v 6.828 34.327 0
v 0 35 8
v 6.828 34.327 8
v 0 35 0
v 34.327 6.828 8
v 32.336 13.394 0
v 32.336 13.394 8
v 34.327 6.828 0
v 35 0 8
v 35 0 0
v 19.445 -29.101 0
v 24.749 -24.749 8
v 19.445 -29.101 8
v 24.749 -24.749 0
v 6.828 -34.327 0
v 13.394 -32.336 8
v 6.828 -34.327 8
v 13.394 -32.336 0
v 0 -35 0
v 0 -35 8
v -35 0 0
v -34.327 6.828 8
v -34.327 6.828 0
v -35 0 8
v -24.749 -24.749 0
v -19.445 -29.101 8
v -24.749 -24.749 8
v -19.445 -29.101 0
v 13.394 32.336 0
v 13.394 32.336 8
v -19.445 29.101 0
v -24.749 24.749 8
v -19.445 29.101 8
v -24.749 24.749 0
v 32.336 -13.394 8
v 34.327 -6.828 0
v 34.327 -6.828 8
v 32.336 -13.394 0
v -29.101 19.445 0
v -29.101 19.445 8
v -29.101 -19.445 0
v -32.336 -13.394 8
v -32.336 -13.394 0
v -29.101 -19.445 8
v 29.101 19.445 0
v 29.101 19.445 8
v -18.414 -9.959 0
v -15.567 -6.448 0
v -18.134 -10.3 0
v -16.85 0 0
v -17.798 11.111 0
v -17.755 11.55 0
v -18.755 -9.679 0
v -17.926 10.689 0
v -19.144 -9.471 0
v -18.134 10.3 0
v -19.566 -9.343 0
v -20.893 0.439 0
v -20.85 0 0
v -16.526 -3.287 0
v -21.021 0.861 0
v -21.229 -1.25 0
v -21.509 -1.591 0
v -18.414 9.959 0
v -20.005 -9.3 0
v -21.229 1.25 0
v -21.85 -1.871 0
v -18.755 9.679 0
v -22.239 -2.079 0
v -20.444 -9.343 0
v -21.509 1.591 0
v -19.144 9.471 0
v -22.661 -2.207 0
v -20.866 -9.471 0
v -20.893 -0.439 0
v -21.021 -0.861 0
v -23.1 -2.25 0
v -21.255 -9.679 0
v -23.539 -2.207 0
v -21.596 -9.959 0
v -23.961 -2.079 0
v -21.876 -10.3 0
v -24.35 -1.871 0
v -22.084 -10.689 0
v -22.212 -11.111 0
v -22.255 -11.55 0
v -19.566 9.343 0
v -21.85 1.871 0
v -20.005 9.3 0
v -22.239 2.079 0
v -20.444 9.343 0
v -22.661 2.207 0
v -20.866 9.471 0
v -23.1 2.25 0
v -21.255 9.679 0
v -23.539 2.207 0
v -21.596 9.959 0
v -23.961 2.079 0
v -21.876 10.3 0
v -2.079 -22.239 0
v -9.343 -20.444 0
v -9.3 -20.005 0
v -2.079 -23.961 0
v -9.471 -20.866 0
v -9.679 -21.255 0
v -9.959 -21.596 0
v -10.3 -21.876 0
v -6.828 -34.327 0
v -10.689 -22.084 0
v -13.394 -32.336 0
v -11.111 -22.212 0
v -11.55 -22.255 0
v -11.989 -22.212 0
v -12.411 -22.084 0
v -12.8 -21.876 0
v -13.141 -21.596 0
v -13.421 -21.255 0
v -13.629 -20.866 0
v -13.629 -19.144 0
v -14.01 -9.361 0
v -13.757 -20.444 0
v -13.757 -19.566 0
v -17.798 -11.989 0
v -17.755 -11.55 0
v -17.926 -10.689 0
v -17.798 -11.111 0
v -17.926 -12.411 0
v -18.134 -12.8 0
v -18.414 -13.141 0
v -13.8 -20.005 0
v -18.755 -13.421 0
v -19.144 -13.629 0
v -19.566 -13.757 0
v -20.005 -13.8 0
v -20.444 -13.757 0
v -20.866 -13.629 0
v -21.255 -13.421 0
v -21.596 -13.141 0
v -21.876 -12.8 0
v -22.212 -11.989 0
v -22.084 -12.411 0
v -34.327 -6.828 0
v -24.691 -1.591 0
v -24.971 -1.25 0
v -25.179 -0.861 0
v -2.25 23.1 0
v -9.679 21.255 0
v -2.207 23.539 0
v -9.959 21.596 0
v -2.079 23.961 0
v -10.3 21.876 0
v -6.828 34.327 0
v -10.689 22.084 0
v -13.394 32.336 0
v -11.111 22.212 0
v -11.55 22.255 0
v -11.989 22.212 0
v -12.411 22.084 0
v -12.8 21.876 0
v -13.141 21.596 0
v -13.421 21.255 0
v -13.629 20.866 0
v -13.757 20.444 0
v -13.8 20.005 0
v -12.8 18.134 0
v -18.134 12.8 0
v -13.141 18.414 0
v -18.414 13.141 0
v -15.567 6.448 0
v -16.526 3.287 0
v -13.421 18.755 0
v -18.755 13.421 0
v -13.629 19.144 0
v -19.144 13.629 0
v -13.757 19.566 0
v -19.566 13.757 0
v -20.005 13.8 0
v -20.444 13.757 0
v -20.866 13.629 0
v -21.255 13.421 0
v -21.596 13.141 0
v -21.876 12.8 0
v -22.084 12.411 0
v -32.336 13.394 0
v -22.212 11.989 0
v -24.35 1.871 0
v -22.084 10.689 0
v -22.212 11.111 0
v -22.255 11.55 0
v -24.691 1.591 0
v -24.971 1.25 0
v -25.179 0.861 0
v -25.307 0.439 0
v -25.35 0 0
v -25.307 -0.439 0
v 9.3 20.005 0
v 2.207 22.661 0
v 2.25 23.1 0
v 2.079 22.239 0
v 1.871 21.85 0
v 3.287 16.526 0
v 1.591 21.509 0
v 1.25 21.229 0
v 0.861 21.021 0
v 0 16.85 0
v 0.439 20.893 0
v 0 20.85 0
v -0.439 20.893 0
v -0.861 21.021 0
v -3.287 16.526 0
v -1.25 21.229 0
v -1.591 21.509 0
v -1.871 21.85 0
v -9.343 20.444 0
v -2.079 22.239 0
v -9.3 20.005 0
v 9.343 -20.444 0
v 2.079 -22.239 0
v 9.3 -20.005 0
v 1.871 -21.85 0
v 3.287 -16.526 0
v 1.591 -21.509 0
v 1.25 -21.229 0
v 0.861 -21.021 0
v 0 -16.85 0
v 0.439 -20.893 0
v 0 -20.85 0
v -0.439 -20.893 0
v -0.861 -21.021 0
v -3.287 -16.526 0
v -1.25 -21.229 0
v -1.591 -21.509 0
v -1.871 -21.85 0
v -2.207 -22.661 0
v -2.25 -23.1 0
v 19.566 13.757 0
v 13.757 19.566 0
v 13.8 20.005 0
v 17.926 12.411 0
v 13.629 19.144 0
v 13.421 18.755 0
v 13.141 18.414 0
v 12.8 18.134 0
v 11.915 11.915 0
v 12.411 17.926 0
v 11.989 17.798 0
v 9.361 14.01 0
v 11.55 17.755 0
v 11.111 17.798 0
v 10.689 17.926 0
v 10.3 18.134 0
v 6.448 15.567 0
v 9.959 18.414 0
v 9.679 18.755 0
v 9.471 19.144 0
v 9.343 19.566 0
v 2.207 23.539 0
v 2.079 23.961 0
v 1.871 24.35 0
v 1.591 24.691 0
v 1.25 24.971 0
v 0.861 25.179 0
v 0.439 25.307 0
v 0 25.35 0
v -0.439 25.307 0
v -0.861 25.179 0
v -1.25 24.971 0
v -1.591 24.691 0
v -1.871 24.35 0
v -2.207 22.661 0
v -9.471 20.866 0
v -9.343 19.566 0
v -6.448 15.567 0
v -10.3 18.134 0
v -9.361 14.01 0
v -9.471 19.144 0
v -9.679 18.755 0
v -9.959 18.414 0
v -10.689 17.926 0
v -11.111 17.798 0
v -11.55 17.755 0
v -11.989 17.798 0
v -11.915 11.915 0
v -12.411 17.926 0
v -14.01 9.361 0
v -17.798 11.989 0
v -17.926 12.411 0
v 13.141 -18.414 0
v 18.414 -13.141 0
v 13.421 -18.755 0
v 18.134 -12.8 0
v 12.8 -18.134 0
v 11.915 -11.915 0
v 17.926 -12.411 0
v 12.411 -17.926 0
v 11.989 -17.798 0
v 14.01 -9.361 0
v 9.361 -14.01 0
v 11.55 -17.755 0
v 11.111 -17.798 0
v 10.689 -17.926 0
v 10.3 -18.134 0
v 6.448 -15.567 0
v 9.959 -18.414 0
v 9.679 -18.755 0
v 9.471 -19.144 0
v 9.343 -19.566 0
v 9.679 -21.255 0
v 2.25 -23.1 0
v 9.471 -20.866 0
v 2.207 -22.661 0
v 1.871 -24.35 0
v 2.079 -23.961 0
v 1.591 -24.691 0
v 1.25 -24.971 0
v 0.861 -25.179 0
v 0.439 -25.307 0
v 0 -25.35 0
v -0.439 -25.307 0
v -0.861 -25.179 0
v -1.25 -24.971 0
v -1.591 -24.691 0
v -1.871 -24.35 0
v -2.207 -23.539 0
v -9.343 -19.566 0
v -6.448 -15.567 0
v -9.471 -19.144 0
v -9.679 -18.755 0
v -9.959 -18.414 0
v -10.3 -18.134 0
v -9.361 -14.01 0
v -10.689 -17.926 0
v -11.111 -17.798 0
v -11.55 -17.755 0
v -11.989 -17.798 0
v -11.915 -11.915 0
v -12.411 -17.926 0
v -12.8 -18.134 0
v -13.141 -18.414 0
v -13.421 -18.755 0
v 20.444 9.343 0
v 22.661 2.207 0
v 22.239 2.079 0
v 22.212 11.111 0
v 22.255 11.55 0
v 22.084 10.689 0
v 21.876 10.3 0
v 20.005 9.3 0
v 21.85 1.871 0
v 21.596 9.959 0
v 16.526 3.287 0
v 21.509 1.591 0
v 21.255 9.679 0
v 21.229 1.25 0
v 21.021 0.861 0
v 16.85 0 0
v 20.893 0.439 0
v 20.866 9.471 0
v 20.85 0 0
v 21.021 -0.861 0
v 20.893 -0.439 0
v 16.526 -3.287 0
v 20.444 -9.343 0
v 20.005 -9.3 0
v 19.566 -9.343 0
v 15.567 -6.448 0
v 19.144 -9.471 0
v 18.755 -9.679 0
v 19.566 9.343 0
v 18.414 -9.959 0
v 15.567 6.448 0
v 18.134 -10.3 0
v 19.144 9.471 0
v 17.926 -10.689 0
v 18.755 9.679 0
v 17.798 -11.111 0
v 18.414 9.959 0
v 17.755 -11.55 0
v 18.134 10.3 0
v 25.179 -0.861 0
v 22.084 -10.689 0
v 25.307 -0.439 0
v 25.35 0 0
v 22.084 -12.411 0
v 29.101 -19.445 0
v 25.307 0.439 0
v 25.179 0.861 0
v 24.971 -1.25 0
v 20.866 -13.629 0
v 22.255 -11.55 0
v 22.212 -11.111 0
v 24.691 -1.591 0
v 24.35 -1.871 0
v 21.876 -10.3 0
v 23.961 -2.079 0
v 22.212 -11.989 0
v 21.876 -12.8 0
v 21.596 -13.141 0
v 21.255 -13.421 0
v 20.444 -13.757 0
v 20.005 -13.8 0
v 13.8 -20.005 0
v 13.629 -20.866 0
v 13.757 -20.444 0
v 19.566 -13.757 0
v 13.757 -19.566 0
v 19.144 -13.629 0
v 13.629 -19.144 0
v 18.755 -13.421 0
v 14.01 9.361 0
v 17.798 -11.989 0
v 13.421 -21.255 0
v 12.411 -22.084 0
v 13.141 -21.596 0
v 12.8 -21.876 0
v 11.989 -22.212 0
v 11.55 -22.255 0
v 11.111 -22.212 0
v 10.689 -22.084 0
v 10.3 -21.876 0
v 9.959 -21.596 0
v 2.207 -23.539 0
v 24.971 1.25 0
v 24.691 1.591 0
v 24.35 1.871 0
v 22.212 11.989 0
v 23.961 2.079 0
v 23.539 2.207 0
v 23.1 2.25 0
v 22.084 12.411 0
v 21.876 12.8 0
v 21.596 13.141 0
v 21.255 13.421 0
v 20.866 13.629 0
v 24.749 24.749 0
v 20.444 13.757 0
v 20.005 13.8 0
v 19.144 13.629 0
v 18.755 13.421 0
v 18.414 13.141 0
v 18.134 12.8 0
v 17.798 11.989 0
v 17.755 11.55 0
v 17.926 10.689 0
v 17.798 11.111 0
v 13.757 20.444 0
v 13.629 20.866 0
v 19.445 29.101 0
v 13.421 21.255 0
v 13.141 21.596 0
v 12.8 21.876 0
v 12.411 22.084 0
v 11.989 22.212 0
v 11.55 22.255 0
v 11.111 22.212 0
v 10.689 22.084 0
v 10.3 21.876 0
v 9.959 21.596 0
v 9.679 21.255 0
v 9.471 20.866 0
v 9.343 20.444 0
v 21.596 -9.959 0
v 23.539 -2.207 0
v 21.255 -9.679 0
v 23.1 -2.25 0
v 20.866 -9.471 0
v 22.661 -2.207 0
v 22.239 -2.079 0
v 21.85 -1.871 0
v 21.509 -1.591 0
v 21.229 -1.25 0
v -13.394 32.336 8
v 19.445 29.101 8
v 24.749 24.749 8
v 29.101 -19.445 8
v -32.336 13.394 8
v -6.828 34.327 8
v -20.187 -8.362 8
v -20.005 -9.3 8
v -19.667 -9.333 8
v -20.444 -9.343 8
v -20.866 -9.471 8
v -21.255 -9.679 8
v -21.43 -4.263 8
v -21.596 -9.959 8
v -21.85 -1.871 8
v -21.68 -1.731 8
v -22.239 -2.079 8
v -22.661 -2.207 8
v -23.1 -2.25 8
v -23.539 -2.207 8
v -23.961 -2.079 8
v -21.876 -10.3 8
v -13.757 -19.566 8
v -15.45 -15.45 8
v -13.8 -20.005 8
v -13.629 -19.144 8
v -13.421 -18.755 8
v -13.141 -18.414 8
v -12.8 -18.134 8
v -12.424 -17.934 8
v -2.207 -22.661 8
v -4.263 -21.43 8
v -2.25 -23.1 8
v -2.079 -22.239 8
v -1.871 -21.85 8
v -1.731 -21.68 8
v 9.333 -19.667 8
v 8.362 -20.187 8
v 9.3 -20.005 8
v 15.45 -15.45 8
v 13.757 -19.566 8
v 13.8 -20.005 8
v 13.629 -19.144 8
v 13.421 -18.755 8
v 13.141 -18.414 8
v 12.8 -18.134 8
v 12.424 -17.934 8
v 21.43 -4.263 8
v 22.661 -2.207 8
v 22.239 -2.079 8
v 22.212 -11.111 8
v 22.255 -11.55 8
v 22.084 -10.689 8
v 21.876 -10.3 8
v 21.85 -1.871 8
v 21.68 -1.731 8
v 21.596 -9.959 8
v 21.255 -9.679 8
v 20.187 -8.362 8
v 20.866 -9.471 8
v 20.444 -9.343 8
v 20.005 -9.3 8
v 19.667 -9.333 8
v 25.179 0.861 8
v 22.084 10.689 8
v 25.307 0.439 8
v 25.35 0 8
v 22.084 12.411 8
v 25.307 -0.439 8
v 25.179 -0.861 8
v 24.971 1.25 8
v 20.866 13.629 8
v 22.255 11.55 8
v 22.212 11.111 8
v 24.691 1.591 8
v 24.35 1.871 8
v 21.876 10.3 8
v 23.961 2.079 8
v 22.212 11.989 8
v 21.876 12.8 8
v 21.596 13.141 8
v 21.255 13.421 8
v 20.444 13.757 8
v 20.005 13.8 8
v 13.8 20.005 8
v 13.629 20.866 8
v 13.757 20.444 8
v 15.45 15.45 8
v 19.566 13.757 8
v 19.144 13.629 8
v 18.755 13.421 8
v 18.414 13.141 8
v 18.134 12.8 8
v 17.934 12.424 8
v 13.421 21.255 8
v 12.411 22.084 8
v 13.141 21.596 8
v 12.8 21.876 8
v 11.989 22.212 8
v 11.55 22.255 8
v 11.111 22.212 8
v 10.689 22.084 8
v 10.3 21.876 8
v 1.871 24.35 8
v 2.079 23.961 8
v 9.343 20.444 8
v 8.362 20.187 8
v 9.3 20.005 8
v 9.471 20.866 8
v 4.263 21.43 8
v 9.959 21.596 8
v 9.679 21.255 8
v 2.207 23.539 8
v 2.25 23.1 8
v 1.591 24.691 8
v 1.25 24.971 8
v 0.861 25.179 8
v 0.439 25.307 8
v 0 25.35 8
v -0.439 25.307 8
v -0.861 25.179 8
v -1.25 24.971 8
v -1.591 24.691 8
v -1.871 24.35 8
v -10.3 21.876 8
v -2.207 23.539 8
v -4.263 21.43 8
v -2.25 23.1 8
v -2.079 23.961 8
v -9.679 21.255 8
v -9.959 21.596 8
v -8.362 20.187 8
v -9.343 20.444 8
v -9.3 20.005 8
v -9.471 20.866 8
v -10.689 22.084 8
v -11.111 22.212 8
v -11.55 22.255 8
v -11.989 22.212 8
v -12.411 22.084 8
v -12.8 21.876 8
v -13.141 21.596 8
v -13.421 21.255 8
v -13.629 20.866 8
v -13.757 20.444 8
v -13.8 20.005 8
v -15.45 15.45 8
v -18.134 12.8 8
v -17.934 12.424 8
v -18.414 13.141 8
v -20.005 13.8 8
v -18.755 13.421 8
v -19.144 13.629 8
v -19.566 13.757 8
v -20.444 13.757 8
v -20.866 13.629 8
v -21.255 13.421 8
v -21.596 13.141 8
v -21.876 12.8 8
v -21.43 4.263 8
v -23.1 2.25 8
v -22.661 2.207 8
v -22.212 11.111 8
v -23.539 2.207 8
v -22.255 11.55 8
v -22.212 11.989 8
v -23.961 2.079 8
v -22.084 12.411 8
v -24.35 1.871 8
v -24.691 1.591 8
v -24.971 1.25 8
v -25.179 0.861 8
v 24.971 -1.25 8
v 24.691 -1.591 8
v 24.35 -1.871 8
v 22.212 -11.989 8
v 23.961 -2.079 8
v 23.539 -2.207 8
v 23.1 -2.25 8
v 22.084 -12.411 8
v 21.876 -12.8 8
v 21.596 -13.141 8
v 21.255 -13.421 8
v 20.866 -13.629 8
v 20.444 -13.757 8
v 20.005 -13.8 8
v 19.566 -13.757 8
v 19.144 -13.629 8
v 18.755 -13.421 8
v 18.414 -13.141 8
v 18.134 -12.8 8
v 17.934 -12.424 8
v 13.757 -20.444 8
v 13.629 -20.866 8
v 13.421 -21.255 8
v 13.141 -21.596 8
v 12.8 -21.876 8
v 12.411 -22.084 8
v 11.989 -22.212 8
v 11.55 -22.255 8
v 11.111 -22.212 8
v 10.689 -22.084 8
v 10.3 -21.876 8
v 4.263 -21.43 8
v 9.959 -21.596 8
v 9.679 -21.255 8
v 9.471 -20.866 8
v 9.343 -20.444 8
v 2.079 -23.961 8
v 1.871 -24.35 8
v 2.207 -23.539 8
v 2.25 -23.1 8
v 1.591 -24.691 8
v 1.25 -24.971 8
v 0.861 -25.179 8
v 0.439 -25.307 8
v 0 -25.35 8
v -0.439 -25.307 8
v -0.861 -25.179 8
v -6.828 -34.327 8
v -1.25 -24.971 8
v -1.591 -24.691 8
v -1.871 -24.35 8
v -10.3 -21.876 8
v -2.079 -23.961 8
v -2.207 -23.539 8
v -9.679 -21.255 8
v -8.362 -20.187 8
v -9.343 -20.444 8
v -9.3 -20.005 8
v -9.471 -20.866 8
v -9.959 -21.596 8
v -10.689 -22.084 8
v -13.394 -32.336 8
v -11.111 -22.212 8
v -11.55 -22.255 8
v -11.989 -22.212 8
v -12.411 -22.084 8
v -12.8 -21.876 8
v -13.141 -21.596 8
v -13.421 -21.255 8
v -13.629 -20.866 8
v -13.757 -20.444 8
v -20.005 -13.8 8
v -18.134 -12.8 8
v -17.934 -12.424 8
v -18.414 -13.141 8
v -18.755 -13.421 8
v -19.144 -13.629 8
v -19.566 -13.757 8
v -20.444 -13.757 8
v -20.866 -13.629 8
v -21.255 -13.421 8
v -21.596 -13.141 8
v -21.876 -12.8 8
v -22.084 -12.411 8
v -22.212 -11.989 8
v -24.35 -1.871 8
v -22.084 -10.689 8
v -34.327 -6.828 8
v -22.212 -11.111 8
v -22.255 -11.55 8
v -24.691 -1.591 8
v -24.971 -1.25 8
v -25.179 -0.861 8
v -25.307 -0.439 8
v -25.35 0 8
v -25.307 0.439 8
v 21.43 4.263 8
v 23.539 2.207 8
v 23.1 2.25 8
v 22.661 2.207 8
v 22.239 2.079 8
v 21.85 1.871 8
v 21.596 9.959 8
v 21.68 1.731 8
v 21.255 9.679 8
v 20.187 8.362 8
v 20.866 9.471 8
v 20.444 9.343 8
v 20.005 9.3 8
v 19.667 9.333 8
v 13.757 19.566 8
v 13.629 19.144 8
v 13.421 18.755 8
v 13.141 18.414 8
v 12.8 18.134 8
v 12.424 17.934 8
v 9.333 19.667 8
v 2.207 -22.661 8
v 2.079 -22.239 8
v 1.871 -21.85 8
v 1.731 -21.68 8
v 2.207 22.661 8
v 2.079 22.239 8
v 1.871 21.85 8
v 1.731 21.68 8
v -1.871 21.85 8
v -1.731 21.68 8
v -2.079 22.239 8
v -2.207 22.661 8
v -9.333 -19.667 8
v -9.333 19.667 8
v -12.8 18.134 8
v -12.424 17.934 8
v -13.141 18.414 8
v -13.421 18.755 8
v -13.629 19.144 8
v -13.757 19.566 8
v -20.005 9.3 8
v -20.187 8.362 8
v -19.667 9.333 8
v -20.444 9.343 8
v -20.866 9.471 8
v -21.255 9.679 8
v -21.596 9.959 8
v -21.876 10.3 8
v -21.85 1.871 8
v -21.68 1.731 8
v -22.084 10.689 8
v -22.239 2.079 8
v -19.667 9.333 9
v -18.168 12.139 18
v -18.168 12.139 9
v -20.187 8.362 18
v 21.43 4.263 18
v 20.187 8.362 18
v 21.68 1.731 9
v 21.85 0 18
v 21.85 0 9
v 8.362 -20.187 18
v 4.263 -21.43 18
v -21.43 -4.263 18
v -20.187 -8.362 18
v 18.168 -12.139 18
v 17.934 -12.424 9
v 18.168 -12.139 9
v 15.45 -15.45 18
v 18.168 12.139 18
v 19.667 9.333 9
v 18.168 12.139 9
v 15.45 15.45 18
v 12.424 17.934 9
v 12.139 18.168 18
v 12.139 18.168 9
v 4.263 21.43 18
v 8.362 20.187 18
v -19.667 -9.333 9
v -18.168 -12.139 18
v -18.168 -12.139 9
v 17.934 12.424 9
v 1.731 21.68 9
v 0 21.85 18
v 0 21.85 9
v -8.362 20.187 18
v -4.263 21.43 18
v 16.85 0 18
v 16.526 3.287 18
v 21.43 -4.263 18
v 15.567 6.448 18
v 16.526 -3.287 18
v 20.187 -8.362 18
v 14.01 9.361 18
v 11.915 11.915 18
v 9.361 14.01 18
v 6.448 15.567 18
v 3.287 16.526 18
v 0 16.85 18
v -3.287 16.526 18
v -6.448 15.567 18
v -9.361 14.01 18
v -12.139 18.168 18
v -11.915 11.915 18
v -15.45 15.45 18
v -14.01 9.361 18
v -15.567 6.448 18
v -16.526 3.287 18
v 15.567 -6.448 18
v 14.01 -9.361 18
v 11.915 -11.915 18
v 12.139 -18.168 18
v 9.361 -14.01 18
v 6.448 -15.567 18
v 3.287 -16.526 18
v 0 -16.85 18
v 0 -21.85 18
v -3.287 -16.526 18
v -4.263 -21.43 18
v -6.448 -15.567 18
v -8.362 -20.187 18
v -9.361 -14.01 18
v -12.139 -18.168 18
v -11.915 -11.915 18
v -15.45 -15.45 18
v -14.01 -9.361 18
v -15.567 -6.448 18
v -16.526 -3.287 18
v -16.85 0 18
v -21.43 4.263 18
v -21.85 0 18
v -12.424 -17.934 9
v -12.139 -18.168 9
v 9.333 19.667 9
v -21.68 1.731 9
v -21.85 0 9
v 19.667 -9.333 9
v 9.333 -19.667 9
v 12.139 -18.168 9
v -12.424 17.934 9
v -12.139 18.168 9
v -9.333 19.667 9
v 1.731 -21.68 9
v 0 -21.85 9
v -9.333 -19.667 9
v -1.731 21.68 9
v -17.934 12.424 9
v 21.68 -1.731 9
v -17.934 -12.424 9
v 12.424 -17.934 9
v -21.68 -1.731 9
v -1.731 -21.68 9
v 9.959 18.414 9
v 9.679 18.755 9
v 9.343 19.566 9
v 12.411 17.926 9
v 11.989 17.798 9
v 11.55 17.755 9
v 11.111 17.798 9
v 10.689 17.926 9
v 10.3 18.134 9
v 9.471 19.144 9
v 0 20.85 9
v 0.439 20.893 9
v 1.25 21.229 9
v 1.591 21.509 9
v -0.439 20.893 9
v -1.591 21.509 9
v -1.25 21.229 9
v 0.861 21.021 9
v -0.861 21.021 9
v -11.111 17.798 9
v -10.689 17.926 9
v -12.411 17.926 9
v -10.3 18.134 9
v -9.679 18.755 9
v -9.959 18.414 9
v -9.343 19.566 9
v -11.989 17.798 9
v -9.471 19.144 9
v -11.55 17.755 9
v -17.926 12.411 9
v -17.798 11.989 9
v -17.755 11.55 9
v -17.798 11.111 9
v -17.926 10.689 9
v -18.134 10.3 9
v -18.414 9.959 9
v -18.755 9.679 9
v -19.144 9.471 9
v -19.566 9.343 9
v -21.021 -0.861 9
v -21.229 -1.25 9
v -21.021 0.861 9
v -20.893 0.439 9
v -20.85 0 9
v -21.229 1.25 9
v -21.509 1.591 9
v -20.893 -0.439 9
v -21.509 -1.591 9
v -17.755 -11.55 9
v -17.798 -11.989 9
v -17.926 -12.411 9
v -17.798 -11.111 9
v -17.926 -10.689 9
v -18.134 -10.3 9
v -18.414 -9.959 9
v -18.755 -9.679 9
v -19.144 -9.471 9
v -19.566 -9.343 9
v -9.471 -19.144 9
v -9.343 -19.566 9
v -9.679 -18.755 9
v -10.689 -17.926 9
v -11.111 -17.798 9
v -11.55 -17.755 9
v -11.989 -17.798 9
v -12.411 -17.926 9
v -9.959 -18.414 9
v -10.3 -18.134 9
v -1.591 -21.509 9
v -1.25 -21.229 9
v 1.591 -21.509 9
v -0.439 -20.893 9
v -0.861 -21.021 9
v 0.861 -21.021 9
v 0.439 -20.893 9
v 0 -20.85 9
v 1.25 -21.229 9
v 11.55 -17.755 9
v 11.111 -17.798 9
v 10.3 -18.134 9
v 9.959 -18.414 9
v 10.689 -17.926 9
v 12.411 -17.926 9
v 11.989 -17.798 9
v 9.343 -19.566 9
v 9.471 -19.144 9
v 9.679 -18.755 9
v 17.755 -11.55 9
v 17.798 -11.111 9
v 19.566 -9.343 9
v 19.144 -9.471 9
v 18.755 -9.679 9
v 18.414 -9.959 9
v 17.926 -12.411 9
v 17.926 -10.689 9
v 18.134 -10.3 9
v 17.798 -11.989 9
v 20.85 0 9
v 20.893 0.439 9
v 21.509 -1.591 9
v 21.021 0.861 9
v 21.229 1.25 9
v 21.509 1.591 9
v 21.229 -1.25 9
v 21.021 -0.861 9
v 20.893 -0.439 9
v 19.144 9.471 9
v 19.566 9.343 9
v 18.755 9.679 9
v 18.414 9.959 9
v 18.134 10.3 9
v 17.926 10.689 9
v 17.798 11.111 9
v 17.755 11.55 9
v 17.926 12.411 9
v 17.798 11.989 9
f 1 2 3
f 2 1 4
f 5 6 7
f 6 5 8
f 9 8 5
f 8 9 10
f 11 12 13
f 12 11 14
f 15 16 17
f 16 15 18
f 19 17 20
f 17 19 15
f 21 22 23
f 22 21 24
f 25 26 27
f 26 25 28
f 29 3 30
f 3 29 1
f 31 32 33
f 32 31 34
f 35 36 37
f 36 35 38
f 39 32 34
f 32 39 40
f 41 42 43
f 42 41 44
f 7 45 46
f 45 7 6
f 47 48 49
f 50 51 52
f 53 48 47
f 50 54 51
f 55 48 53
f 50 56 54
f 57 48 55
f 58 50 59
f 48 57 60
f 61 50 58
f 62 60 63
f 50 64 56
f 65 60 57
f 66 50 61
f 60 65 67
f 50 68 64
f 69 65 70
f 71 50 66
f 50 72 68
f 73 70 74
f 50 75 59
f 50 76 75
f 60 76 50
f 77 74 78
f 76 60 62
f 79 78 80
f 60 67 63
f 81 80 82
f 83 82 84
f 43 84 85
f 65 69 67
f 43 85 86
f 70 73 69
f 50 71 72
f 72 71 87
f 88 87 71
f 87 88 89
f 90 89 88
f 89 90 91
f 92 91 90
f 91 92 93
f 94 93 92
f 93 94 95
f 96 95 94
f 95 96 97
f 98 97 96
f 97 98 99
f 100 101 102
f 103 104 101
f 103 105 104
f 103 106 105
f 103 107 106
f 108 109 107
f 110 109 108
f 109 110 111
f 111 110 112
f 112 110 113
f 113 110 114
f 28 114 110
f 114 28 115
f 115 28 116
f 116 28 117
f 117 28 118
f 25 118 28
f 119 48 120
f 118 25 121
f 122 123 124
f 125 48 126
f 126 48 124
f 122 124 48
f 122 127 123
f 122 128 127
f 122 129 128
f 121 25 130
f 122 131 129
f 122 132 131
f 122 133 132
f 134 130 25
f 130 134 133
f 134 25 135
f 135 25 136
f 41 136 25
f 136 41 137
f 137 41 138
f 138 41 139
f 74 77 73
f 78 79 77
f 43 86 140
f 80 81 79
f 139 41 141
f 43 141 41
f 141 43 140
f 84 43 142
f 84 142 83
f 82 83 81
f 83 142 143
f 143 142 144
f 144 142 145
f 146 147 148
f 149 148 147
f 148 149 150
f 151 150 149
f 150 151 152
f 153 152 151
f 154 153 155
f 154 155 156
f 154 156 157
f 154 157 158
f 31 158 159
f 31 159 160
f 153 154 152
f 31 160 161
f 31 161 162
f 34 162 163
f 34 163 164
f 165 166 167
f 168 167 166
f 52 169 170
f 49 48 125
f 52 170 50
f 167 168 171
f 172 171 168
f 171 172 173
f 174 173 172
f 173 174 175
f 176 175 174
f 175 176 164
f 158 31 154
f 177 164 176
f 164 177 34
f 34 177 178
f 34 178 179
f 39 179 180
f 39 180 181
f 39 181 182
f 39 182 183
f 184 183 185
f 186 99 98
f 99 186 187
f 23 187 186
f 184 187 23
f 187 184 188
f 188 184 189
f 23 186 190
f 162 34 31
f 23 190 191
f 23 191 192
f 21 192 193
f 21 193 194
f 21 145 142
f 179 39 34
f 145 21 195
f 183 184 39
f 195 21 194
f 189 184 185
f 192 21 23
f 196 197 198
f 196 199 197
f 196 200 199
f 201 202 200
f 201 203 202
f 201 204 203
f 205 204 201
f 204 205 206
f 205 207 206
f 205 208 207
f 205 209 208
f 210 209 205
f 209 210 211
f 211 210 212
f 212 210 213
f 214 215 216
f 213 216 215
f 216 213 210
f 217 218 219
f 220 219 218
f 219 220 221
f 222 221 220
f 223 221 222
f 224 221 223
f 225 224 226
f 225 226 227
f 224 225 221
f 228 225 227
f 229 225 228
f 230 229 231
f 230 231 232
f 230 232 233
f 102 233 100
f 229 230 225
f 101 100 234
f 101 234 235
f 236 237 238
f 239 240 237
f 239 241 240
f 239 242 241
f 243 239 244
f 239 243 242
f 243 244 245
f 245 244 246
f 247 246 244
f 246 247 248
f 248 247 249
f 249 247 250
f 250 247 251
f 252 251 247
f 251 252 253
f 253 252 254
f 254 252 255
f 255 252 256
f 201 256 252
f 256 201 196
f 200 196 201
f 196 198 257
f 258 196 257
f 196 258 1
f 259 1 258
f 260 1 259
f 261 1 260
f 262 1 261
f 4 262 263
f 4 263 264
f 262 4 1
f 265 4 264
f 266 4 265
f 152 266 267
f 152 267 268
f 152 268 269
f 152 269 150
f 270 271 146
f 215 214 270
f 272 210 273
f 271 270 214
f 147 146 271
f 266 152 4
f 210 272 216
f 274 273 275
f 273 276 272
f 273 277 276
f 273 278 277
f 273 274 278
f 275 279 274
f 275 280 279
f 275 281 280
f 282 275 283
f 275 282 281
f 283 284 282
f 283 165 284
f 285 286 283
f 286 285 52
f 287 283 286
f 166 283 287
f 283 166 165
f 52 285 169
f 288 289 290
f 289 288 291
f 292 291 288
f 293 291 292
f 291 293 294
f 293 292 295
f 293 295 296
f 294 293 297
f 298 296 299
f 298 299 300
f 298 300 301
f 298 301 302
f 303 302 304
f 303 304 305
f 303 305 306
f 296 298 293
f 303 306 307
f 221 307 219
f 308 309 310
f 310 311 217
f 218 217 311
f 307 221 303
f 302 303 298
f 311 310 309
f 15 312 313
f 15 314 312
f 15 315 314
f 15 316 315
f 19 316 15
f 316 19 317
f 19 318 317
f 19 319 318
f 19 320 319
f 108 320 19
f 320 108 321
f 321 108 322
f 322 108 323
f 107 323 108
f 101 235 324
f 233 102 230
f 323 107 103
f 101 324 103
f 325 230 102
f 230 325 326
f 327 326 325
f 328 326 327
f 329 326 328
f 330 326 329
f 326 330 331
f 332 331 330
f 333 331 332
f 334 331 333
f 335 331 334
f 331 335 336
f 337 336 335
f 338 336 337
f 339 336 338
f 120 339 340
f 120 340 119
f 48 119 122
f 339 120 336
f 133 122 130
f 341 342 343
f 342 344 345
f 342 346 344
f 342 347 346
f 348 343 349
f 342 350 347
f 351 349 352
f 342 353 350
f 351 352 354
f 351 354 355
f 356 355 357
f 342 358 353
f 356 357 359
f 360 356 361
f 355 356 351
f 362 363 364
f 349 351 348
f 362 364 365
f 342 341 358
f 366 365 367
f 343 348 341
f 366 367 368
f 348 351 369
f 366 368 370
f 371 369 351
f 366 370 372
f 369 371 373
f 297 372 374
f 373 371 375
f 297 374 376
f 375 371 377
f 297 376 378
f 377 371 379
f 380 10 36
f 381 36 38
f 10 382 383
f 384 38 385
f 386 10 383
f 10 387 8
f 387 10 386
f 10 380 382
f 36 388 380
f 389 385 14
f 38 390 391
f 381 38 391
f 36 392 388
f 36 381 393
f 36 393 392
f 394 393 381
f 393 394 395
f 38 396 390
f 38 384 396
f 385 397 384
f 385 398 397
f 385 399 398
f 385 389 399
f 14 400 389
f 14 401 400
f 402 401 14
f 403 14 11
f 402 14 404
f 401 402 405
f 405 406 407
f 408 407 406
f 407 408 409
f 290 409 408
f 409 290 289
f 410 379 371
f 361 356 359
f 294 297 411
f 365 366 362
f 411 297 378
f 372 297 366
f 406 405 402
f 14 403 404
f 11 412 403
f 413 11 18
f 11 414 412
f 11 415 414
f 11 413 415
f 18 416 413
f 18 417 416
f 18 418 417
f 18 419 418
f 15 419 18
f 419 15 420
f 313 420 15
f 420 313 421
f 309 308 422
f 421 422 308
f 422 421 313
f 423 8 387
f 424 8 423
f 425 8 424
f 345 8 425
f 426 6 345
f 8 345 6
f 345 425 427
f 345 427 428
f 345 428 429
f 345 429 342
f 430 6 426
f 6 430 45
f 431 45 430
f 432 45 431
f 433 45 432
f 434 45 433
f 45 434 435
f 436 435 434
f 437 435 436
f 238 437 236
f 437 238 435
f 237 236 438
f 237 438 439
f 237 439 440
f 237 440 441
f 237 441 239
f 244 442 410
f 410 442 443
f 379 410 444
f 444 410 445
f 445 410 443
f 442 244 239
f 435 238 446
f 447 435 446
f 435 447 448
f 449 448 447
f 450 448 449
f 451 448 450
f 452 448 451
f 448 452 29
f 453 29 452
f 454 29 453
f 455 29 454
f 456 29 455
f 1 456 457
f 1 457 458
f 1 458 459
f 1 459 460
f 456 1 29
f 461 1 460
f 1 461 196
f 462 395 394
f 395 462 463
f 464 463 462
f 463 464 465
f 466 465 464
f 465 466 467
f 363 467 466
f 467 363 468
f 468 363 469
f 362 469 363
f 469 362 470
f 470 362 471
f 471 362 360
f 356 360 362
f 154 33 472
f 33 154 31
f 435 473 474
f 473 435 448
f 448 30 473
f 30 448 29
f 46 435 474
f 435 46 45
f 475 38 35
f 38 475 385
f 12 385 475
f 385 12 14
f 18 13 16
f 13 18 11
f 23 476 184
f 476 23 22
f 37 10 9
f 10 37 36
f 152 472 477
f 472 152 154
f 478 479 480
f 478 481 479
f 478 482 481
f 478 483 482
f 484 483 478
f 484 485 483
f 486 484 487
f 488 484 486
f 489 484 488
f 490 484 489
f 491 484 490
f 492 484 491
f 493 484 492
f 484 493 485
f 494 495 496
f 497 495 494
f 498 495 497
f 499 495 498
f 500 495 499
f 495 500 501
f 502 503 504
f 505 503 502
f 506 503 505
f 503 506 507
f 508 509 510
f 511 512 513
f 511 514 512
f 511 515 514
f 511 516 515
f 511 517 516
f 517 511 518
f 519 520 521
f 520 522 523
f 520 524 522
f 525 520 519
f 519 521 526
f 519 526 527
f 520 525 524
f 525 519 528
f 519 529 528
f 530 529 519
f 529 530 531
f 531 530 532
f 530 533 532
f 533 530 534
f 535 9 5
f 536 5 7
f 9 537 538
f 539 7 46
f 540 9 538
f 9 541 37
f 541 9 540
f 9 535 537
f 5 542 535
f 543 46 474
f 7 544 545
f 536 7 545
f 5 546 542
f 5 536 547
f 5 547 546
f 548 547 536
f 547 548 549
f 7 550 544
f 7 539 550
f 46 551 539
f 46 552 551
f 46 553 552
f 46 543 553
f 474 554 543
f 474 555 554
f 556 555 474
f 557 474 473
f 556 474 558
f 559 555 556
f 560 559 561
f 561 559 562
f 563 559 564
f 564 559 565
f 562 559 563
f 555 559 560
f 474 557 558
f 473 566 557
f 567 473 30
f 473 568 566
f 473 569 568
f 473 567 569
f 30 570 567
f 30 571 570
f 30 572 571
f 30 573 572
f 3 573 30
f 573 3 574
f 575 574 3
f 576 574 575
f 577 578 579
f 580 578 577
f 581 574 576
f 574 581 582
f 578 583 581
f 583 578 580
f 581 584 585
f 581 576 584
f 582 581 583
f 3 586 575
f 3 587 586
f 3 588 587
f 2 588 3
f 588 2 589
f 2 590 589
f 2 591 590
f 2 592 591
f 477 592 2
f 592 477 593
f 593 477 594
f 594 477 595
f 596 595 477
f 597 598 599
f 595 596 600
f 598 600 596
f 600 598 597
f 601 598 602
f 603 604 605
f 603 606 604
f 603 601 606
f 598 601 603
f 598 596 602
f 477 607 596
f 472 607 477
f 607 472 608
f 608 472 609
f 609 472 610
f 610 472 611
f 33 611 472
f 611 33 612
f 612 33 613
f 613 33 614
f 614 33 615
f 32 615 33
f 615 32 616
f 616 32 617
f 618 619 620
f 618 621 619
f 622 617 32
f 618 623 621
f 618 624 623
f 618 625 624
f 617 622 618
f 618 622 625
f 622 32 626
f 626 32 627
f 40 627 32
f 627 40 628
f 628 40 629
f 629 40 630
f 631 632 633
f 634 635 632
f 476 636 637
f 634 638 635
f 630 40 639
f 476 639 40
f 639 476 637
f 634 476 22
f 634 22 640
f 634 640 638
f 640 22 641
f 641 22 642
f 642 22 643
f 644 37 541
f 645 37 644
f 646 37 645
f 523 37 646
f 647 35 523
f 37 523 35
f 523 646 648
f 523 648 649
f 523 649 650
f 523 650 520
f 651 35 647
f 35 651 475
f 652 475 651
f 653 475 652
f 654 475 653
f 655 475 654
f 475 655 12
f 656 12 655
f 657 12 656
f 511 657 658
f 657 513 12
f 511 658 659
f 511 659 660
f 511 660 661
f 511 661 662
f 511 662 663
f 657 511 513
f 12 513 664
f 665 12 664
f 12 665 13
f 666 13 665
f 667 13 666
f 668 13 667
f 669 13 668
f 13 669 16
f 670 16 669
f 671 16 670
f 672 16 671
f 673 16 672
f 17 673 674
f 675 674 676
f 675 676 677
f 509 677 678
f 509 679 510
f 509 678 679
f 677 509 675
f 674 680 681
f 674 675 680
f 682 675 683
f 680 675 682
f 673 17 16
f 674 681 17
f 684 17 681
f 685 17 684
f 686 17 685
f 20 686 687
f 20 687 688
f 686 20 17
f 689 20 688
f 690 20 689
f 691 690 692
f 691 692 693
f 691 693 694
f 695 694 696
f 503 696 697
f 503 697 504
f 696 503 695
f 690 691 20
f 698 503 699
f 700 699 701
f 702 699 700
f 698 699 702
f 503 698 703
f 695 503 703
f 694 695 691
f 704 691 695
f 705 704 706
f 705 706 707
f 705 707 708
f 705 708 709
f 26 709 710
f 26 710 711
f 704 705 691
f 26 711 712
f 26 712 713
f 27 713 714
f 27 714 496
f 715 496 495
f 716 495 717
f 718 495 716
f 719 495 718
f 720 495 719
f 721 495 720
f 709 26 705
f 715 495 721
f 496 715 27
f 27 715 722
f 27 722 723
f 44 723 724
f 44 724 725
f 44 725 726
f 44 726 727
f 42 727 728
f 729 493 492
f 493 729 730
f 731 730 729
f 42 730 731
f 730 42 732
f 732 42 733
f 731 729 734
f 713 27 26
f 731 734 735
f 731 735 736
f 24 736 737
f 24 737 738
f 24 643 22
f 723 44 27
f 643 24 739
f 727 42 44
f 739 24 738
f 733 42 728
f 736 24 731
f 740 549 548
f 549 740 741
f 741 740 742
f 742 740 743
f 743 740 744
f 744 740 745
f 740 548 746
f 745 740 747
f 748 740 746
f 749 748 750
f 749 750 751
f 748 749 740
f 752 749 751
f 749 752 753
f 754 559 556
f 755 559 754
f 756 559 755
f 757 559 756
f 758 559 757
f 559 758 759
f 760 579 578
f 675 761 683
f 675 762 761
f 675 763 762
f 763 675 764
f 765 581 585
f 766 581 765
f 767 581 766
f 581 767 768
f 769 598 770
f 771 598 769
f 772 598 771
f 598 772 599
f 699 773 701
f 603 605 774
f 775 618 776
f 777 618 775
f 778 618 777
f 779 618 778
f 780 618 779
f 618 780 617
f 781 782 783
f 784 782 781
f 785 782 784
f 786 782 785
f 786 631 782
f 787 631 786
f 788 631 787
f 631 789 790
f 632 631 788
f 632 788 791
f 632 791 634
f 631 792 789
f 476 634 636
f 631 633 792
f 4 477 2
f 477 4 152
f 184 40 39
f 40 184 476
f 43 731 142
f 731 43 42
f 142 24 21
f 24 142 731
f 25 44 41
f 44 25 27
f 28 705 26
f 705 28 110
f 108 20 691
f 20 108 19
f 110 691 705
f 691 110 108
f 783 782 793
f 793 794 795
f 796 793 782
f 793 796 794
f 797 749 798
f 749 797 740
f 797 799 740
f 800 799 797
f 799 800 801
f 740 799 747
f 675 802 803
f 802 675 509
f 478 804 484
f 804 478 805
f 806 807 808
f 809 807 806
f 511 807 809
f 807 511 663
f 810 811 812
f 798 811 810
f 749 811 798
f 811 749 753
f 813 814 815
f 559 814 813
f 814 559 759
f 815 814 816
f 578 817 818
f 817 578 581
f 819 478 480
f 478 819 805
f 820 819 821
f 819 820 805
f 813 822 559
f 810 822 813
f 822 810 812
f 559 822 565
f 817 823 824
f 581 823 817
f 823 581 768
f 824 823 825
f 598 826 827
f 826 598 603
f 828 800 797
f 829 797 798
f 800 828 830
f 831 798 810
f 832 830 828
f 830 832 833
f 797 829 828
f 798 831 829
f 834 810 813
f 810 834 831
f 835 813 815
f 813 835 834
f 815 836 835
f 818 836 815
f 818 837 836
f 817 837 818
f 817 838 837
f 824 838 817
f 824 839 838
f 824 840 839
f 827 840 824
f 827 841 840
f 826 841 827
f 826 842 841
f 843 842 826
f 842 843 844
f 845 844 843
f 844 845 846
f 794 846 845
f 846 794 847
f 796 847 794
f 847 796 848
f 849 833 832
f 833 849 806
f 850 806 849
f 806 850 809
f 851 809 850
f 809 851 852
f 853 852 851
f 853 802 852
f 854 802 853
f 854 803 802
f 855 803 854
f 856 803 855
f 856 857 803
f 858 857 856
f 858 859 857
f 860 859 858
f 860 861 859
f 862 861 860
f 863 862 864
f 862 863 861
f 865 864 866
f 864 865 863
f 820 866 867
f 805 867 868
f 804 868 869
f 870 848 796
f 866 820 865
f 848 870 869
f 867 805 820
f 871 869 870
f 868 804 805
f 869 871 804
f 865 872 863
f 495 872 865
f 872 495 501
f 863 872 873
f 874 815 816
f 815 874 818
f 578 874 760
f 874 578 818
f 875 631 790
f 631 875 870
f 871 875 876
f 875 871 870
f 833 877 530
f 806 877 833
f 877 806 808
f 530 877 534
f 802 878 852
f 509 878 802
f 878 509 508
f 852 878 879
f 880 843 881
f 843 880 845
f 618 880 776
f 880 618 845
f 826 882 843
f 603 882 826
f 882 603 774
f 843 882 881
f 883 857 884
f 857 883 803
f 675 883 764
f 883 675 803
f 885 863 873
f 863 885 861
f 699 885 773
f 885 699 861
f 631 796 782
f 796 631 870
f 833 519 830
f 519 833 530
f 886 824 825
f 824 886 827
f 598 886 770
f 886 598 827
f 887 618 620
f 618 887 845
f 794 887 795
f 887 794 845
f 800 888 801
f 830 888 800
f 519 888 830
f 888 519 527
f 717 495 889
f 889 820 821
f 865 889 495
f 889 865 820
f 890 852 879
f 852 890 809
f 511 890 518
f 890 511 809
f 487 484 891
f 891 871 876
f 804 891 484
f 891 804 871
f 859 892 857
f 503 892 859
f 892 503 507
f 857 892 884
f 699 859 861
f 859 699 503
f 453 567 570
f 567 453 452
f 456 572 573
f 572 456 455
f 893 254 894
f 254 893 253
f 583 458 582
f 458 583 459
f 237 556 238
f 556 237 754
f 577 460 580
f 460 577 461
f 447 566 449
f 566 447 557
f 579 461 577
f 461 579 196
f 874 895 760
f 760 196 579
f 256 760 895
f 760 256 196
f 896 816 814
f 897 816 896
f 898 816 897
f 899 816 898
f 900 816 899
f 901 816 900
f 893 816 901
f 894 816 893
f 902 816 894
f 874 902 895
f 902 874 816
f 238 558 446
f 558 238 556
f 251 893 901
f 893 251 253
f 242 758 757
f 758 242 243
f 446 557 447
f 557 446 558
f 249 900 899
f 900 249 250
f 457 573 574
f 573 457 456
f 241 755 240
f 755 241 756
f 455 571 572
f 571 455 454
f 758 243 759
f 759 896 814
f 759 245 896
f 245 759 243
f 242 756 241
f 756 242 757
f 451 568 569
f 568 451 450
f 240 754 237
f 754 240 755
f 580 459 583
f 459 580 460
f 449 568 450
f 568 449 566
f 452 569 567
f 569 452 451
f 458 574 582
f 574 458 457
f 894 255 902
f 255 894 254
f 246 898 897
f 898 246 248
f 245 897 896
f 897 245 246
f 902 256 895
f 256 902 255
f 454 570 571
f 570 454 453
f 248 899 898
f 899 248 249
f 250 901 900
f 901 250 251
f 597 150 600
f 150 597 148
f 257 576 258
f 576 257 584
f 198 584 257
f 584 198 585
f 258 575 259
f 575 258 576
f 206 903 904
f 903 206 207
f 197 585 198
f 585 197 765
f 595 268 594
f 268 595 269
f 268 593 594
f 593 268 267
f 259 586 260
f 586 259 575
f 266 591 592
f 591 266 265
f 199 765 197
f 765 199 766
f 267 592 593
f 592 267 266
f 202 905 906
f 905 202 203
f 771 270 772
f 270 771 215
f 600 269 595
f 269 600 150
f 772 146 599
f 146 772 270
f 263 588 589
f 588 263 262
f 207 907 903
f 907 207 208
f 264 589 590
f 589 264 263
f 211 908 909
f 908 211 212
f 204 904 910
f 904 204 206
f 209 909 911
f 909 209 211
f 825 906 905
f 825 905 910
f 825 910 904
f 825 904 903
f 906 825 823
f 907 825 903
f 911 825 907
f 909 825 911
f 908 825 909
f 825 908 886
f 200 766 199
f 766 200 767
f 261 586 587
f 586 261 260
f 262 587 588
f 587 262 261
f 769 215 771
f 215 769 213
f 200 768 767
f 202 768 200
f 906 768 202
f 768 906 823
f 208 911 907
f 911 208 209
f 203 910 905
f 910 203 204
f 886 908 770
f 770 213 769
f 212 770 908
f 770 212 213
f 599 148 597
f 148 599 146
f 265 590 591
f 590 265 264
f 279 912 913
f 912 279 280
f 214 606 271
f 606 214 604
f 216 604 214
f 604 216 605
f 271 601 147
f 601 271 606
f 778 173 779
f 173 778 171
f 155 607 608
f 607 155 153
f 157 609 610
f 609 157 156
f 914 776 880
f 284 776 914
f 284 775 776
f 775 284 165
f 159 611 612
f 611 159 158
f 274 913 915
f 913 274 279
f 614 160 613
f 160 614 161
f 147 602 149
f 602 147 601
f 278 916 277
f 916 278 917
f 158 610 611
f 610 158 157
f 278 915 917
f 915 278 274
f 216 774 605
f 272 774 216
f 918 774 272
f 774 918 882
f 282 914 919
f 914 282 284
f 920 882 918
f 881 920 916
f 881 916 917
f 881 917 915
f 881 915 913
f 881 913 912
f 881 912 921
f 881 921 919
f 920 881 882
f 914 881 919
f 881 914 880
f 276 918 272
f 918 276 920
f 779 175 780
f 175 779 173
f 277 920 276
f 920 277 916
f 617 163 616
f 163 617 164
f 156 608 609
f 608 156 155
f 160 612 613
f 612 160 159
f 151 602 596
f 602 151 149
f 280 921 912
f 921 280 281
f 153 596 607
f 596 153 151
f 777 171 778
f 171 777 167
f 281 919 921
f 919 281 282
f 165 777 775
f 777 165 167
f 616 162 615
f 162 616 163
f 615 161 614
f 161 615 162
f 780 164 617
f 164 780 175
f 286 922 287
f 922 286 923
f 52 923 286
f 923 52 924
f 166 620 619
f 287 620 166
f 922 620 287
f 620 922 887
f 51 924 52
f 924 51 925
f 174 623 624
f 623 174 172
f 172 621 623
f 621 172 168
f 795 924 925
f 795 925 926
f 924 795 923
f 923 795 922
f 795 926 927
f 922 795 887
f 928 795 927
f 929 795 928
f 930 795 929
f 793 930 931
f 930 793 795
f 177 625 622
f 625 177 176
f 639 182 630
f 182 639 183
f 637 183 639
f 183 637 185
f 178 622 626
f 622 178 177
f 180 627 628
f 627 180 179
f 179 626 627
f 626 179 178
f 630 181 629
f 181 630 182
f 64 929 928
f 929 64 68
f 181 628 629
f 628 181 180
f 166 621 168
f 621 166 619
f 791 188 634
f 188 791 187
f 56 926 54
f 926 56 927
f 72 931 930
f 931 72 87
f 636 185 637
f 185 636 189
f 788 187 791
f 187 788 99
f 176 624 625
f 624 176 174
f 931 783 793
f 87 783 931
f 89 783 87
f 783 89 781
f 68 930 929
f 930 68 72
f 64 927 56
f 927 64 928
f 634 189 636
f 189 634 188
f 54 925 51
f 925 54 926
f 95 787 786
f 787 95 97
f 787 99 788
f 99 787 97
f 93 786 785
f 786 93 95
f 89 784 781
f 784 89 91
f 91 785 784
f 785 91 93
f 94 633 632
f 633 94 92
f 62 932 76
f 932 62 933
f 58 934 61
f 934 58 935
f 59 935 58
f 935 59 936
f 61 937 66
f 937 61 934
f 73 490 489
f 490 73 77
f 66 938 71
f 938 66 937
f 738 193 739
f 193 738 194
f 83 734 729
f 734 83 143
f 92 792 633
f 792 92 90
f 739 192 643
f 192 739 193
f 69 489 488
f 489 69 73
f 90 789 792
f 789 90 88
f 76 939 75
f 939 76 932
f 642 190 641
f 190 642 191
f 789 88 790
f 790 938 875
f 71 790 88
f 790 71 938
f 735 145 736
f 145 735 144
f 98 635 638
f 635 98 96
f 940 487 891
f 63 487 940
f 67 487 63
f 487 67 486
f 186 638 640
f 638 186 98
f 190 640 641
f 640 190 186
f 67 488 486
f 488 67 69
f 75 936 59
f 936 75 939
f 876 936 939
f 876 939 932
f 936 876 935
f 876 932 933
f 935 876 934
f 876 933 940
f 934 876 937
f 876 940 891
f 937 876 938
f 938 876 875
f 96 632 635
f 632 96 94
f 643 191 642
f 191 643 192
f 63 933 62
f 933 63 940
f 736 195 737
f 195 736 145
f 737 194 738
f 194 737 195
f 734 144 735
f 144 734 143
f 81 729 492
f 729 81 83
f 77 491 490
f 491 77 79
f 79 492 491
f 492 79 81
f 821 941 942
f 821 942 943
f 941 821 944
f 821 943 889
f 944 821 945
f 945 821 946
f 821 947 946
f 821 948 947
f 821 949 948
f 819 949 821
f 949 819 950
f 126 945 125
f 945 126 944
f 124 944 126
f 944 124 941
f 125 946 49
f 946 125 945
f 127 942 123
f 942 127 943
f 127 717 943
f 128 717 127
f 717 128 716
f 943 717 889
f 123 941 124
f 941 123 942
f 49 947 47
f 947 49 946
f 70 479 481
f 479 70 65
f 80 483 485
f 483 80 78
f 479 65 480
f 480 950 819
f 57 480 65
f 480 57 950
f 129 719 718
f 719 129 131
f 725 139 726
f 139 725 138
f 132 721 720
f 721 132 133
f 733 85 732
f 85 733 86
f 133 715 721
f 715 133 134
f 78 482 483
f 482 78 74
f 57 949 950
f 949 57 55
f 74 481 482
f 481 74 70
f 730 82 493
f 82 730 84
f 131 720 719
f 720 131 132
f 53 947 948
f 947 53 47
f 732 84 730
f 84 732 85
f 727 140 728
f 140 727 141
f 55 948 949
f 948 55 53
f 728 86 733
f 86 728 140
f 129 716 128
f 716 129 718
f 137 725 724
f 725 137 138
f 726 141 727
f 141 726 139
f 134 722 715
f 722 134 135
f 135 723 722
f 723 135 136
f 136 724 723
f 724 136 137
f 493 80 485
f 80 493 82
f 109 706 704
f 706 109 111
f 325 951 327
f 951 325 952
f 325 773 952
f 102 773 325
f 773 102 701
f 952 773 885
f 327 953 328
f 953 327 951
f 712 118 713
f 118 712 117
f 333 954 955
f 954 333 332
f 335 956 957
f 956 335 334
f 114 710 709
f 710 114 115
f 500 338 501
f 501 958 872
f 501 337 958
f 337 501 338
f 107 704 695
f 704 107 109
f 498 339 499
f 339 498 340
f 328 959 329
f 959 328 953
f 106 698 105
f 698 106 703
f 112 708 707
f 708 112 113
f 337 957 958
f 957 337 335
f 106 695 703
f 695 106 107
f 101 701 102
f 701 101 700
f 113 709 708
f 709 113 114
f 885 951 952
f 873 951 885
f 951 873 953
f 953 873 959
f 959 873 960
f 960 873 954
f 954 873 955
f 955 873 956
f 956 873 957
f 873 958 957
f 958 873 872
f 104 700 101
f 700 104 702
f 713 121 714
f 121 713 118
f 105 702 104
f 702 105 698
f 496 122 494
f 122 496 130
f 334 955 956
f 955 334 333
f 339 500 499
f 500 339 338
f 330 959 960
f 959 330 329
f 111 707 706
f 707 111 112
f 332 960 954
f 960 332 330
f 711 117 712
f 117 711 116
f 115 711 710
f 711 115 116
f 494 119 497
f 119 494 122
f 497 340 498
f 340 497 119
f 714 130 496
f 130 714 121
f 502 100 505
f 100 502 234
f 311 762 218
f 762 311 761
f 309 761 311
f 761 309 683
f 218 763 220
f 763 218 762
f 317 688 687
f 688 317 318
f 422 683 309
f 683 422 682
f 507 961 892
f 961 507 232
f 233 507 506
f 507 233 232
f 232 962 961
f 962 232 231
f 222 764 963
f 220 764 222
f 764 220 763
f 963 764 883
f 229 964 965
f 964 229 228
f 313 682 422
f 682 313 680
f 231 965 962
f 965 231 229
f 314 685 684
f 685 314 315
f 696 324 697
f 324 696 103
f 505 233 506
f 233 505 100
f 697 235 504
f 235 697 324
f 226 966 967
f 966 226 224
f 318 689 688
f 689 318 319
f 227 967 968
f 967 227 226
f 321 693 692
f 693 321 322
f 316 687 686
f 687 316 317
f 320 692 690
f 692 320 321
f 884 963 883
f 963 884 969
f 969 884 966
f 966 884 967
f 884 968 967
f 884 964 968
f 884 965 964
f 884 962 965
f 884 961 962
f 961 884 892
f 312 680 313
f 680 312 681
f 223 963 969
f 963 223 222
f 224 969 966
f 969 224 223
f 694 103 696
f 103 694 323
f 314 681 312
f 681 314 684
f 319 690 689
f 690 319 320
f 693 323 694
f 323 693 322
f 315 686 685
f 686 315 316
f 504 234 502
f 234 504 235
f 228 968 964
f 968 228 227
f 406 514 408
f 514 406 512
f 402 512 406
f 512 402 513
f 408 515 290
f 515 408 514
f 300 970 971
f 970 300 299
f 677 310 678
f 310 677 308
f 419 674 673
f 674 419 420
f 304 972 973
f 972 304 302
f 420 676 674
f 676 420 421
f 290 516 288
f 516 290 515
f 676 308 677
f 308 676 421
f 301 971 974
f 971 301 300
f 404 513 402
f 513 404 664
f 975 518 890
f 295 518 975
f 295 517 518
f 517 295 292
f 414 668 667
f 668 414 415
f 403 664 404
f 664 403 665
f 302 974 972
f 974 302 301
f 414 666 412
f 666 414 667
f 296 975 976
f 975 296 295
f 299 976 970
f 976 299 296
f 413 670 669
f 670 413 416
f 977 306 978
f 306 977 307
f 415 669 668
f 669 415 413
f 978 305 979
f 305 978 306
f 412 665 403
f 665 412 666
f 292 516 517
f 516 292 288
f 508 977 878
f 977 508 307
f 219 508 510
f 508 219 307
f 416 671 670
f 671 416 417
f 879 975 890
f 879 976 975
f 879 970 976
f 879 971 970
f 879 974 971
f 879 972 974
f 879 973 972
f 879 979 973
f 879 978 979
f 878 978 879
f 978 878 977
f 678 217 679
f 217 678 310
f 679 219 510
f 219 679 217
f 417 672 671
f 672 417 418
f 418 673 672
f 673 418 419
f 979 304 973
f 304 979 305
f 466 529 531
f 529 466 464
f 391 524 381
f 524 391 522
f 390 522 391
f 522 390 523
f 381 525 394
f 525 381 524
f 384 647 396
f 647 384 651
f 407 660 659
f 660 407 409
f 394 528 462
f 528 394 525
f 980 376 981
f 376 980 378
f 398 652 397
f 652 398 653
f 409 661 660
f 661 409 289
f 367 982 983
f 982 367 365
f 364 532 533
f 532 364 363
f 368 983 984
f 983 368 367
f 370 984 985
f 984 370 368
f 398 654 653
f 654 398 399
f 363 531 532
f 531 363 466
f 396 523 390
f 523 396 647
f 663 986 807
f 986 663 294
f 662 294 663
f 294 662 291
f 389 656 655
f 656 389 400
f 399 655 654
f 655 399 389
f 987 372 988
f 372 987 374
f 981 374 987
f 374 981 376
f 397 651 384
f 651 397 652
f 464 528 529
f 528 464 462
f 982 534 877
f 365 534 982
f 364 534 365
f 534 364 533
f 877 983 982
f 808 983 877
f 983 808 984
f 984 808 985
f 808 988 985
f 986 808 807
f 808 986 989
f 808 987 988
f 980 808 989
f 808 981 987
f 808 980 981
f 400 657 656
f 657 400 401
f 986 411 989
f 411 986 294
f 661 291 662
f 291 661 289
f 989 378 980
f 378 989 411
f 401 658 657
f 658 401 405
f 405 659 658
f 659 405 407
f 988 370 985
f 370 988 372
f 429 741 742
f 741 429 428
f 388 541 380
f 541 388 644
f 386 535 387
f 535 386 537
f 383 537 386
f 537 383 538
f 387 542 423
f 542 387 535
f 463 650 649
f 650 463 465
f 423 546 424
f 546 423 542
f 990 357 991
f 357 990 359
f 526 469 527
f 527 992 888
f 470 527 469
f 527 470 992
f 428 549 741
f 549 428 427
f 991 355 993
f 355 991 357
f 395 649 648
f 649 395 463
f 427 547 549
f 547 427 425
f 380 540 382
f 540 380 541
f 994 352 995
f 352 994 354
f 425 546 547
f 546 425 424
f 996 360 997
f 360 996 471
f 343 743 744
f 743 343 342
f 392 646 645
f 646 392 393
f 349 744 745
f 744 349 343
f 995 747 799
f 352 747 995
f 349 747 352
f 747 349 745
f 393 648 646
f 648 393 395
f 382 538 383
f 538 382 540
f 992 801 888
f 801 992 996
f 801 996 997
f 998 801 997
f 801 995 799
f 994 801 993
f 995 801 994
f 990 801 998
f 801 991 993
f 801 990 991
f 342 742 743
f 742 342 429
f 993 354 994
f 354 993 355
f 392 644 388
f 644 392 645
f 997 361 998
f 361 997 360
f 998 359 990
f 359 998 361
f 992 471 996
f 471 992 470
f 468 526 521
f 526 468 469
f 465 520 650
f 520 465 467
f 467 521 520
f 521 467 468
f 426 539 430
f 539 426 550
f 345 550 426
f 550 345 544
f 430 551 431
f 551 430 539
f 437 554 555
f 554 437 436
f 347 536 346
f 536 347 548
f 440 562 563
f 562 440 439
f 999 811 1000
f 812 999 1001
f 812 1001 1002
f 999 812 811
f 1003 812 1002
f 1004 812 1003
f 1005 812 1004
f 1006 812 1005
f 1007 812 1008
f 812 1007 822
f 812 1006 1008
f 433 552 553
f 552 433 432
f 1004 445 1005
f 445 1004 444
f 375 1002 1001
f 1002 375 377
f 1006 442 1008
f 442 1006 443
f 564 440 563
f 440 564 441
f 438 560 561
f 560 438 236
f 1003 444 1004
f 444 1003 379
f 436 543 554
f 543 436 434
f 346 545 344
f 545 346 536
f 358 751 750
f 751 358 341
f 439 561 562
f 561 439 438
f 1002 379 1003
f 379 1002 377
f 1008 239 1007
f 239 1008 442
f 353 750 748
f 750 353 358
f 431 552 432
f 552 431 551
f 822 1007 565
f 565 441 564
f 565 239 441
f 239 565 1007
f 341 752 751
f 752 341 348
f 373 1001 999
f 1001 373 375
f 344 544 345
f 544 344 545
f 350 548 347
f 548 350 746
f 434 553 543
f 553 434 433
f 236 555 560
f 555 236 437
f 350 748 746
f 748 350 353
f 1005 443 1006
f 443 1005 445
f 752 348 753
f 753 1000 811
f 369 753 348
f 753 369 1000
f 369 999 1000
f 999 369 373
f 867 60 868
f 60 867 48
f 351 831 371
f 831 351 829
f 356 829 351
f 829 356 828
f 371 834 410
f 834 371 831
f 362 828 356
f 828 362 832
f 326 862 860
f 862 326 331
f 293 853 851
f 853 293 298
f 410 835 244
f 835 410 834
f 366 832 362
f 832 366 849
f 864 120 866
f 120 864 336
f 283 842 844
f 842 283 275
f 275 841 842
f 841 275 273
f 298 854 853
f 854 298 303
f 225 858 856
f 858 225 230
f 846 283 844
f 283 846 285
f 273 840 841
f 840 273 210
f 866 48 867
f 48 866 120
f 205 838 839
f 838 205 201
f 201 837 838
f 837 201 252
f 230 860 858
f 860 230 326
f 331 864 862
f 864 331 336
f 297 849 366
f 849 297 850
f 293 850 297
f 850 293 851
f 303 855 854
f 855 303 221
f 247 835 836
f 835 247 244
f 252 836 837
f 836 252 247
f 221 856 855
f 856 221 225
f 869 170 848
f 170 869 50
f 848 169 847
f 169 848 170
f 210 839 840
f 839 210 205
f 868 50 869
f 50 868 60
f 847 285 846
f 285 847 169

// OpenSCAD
$fn = 32;

// ----------------------------------------------------------------------
// Flange Ø70 x 8
// 12 holes on a Ø46.2 bolt circle, bolted joints
// ----------------------------------------------------------------------

// --- parameters (mm) ---
flange_d = 70;   // outside diameter of the flange
thickness = 8;   // flange thickness
holes = 12;      // number of bolt holes
pcd = 46.2;      // bolt circle diameter
start_deg = 60;  // angle of the first hole, from +X
hole_d = 4.5;    // bolt hole diameter
bore_d = 33.7;   // central through bore
hub_d = 43.7;    // hub outside diameter
hub_h = 10;      // hub height above the flange face (0 = no hub)

// --- derived feature positions (mm) ---
height = thickness + hub_h;  // = 18   overall height of the part
pcd_r = pcd / 2;             // = 23.1   bolt circle radius
hole_step = 360 / holes;     // = 30   angular pitch
feature_centers = [
  [pcd_r * cos(start_deg + 0 * hole_step), pcd_r * sin(start_deg + 0 * hole_step)],
  [pcd_r * cos(start_deg + 1 * hole_step), pcd_r * sin(start_deg + 1 * hole_step)],
  [pcd_r * cos(start_deg + 2 * hole_step), pcd_r * sin(start_deg + 2 * hole_step)],
  [pcd_r * cos(start_deg + 3 * hole_step), pcd_r * sin(start_deg + 3 * hole_step)],
  [pcd_r * cos(start_deg + 4 * hole_step), pcd_r * sin(start_deg + 4 * hole_step)],
  [pcd_r * cos(start_deg + 5 * hole_step), pcd_r * sin(start_deg + 5 * hole_step)],
  [pcd_r * cos(start_deg + 6 * hole_step), pcd_r * sin(start_deg + 6 * hole_step)],
  [pcd_r * cos(start_deg + 7 * hole_step), pcd_r * sin(start_deg + 7 * hole_step)],
  [pcd_r * cos(start_deg + 8 * hole_step), pcd_r * sin(start_deg + 8 * hole_step)],
  [pcd_r * cos(start_deg + 9 * hole_step), pcd_r * sin(start_deg + 9 * hole_step)],
  [pcd_r * cos(start_deg + 10 * hole_step), pcd_r * sin(start_deg + 10 * hole_step)],
  [pcd_r * cos(start_deg + 11 * hole_step), pcd_r * sin(start_deg + 11 * hole_step)]
];   // bolt hole centres on the pitch circle

// flange disc, every hole and the bore cut straight through
difference() {
  union() {
    cylinder(d = flange_d, h = thickness);
    cylinder(d = hub_d, h = height);  // hub, overlapped into the flange
  }
  translate([0, 0, -1]) cylinder(d = bore_d, h = height + 2);  // bore, through
  for (centre = feature_centers)
    translate([centre[0], centre[1], -1]) cylinder(d = hole_d, h = thickness + 2);
}
